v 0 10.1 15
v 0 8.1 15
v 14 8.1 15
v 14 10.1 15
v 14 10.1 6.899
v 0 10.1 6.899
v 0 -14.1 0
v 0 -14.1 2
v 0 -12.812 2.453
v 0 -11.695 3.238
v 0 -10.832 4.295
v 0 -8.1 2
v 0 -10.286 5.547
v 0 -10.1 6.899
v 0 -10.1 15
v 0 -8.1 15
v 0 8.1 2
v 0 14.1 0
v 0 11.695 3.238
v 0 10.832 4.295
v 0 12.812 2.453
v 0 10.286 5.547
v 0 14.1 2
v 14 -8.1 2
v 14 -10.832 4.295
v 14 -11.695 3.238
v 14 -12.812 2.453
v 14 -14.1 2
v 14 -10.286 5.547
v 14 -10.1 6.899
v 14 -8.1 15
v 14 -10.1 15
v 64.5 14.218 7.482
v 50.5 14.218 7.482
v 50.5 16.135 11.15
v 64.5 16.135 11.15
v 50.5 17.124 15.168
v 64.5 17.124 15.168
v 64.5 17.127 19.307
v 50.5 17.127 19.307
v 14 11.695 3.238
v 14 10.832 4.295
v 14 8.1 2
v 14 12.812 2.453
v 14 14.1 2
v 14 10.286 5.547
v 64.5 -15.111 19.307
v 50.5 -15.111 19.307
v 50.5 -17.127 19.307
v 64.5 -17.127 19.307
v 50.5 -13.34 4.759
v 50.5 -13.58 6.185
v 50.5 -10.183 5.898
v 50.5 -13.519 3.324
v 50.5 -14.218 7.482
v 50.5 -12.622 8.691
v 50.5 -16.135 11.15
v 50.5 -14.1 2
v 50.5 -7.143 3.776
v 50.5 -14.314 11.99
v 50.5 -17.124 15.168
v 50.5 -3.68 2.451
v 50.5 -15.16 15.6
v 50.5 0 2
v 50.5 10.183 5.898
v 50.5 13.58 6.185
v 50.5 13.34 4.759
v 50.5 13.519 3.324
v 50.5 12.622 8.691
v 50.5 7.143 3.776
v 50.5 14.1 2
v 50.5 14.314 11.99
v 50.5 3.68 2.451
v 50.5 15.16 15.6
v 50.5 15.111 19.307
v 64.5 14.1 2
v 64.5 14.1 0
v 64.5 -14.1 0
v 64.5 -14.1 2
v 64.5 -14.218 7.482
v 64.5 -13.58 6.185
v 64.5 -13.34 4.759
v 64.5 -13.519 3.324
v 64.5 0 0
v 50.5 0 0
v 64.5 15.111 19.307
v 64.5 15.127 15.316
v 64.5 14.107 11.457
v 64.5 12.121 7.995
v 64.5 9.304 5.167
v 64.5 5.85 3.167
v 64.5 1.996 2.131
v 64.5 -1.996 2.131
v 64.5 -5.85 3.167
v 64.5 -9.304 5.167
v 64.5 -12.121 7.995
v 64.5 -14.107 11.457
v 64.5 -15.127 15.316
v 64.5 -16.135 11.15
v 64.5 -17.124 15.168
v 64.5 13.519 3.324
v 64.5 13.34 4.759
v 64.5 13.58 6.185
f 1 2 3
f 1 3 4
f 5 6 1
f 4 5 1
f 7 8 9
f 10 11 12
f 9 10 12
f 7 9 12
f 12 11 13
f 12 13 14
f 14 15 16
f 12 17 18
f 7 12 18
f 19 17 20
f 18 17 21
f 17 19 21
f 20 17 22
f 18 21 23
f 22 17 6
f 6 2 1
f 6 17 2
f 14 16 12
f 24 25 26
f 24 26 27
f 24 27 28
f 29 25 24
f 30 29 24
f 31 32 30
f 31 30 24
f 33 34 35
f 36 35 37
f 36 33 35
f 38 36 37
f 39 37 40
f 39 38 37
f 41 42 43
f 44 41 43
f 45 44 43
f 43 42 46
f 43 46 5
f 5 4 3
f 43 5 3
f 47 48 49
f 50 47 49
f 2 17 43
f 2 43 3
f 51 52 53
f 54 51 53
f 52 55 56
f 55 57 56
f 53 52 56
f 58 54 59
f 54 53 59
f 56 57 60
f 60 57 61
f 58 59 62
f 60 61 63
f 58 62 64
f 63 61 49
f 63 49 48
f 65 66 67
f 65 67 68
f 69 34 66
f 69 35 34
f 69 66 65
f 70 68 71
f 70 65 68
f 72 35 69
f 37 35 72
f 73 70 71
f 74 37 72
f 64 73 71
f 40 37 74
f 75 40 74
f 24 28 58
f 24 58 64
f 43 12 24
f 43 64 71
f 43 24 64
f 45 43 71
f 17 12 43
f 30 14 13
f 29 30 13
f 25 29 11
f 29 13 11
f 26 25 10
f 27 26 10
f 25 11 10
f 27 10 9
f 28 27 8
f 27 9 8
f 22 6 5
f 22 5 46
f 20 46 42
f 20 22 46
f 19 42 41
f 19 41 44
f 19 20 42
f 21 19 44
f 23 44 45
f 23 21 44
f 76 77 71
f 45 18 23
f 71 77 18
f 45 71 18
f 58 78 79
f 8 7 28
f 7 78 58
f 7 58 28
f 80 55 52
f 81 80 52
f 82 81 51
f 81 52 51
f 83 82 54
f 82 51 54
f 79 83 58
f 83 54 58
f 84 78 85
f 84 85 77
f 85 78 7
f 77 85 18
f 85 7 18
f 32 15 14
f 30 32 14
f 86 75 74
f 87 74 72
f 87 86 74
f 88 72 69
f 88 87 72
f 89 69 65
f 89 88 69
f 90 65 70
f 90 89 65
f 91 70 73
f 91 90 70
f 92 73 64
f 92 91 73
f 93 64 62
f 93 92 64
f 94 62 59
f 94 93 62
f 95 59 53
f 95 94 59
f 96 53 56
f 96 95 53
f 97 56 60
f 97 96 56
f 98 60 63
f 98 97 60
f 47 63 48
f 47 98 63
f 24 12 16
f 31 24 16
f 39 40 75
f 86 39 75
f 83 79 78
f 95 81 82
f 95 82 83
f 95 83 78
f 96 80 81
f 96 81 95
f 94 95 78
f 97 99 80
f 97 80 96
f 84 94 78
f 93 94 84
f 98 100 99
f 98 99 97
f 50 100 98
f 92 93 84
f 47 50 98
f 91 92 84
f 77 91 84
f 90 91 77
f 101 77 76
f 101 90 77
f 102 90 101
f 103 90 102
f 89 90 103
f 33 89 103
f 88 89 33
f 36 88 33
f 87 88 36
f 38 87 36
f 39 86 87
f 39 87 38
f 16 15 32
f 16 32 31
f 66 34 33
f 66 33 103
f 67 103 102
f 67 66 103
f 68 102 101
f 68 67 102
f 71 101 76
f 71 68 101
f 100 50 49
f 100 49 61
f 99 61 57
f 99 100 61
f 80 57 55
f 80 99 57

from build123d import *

# Parameters (mm, degrees)
F0_W        = 2
F0_H        = 13
F0_W_2      = 4
F0_H_2      = 2
F1_DEPTH    = 14
F2_DEPTH    = 64.5
F4_DEPTH    = 14
F5_T1_DEPTH = 14
F5_T3_DEPTH = 14


# Not quite as in the source:
# - a fillet or chamfer that OpenCascade refuses, or shapes differently, is made with other operations: its cross-section is extruded or revolved along the edge and cut away or added


with BuildPart() as f1:
    # F0 (on Right) → F1 (new body)
    with BuildSketch(Plane.YZ):
        Polygon((-10.1, 0), (0, 0), (10.1, 0), (10.1, 2), (8.1, 2), (0, 2), (-8.1, 2), (-10.1, 2), align=None)
        with Locations((-9.1, 8.5)):
            Rectangle(F0_W, F0_H)
        with Locations((9.1, 8.5)):
            Rectangle(F0_W, F0_H)
        with Locations((-12.1, 1)):
            Rectangle(F0_W_2, F0_H_2)
        with Locations((12.1, 1)):
            Rectangle(F0_W_2, F0_H_2)
    extrude(amount=F1_DEPTH)

    # F0 (on Right) → F2 (join)
    with BuildSketch(Plane.YZ):
        with Locations((-12.1, 1)):
            Rectangle(F0_W_2, F0_H_2)
        Polygon((-10.1, 0), (0, 0), (10.1, 0), (10.1, 2), (8.1, 2), (0, 2), (-8.1, 2), (-10.1, 2), align=None)
        with Locations((12.1, 1)):
            Rectangle(F0_W_2, F0_H_2)
    extrude(amount=F2_DEPTH)

    # F3 (on face) → F4 (join)
    with BuildSketch(Plane.YZ.offset(64.5)):
        with BuildLine():
            ThreePointArc((15.1106605022, 19.3068031473), (0, 2), (-15.1106605022, 19.3068031473))
            Line((-15.1106605022, 19.3068031473), (-17.1269396219, 19.3068031473))
            ThreePointArc((-17.1269396219, 19.3068031473), (0, 0), (17.1269396219, 19.3068031473))
            Line((17.1269396219, 19.3068031473), (15.1106605022, 19.3068031473))
        make_face()
    extrude(amount=-F4_DEPTH)

    # F5: fillet of radius 5 on 4 edges, made by hand

    # F5_s2 → F5_t1 (join)
    with BuildSketch(Plane.YZ):
        with BuildLine():
            ThreePointArc((-10.1, 6.8989794856), (-11.2270166538, 3.7367018254), (-14.1, 2))
            Line((-14.1, 2), (-10.1, 2))
            Line((-10.1, 2), (-10.1, 6.8989794856))
        make_face()
        with BuildLine():
            ThreePointArc((10.1, 6.8989794856), (11.2270166538, 3.7367018254), (14.1, 2))
            Line((14.1, 2), (10.1, 2))
            Line((10.1, 2), (10.1, 6.8989794856))
        make_face()
    extrude(amount=F5_T1_DEPTH)

    # F5_s4 → F5_t3 (join)
    with BuildSketch(Plane.YZ.offset(50.5)):
        with BuildLine():
            ThreePointArc((-14.2181121589, 7.4823090427), (-13.3404640704, 4.7587904606), (-14.1, 2))
            Line((-14.1, 2), (-8.0622577483, 2))
            ThreePointArc((-8.0622577483, 2), (-11.4724735306, 4.3680416438), (-14.2181121589, 7.4823090427))
        make_face()
        with BuildLine():
            ThreePointArc((14.2181121589, 7.4823090427), (13.3404640704, 4.7587904606), (14.1, 2))
            Line((14.1, 2), (8.0622577483, 2))
            ThreePointArc((8.0622577483, 2), (11.4724735306, 4.3680416438), (14.2181121589, 7.4823090427))
        make_face()
    extrude(amount=F5_T3_DEPTH)


solid = f1.part
